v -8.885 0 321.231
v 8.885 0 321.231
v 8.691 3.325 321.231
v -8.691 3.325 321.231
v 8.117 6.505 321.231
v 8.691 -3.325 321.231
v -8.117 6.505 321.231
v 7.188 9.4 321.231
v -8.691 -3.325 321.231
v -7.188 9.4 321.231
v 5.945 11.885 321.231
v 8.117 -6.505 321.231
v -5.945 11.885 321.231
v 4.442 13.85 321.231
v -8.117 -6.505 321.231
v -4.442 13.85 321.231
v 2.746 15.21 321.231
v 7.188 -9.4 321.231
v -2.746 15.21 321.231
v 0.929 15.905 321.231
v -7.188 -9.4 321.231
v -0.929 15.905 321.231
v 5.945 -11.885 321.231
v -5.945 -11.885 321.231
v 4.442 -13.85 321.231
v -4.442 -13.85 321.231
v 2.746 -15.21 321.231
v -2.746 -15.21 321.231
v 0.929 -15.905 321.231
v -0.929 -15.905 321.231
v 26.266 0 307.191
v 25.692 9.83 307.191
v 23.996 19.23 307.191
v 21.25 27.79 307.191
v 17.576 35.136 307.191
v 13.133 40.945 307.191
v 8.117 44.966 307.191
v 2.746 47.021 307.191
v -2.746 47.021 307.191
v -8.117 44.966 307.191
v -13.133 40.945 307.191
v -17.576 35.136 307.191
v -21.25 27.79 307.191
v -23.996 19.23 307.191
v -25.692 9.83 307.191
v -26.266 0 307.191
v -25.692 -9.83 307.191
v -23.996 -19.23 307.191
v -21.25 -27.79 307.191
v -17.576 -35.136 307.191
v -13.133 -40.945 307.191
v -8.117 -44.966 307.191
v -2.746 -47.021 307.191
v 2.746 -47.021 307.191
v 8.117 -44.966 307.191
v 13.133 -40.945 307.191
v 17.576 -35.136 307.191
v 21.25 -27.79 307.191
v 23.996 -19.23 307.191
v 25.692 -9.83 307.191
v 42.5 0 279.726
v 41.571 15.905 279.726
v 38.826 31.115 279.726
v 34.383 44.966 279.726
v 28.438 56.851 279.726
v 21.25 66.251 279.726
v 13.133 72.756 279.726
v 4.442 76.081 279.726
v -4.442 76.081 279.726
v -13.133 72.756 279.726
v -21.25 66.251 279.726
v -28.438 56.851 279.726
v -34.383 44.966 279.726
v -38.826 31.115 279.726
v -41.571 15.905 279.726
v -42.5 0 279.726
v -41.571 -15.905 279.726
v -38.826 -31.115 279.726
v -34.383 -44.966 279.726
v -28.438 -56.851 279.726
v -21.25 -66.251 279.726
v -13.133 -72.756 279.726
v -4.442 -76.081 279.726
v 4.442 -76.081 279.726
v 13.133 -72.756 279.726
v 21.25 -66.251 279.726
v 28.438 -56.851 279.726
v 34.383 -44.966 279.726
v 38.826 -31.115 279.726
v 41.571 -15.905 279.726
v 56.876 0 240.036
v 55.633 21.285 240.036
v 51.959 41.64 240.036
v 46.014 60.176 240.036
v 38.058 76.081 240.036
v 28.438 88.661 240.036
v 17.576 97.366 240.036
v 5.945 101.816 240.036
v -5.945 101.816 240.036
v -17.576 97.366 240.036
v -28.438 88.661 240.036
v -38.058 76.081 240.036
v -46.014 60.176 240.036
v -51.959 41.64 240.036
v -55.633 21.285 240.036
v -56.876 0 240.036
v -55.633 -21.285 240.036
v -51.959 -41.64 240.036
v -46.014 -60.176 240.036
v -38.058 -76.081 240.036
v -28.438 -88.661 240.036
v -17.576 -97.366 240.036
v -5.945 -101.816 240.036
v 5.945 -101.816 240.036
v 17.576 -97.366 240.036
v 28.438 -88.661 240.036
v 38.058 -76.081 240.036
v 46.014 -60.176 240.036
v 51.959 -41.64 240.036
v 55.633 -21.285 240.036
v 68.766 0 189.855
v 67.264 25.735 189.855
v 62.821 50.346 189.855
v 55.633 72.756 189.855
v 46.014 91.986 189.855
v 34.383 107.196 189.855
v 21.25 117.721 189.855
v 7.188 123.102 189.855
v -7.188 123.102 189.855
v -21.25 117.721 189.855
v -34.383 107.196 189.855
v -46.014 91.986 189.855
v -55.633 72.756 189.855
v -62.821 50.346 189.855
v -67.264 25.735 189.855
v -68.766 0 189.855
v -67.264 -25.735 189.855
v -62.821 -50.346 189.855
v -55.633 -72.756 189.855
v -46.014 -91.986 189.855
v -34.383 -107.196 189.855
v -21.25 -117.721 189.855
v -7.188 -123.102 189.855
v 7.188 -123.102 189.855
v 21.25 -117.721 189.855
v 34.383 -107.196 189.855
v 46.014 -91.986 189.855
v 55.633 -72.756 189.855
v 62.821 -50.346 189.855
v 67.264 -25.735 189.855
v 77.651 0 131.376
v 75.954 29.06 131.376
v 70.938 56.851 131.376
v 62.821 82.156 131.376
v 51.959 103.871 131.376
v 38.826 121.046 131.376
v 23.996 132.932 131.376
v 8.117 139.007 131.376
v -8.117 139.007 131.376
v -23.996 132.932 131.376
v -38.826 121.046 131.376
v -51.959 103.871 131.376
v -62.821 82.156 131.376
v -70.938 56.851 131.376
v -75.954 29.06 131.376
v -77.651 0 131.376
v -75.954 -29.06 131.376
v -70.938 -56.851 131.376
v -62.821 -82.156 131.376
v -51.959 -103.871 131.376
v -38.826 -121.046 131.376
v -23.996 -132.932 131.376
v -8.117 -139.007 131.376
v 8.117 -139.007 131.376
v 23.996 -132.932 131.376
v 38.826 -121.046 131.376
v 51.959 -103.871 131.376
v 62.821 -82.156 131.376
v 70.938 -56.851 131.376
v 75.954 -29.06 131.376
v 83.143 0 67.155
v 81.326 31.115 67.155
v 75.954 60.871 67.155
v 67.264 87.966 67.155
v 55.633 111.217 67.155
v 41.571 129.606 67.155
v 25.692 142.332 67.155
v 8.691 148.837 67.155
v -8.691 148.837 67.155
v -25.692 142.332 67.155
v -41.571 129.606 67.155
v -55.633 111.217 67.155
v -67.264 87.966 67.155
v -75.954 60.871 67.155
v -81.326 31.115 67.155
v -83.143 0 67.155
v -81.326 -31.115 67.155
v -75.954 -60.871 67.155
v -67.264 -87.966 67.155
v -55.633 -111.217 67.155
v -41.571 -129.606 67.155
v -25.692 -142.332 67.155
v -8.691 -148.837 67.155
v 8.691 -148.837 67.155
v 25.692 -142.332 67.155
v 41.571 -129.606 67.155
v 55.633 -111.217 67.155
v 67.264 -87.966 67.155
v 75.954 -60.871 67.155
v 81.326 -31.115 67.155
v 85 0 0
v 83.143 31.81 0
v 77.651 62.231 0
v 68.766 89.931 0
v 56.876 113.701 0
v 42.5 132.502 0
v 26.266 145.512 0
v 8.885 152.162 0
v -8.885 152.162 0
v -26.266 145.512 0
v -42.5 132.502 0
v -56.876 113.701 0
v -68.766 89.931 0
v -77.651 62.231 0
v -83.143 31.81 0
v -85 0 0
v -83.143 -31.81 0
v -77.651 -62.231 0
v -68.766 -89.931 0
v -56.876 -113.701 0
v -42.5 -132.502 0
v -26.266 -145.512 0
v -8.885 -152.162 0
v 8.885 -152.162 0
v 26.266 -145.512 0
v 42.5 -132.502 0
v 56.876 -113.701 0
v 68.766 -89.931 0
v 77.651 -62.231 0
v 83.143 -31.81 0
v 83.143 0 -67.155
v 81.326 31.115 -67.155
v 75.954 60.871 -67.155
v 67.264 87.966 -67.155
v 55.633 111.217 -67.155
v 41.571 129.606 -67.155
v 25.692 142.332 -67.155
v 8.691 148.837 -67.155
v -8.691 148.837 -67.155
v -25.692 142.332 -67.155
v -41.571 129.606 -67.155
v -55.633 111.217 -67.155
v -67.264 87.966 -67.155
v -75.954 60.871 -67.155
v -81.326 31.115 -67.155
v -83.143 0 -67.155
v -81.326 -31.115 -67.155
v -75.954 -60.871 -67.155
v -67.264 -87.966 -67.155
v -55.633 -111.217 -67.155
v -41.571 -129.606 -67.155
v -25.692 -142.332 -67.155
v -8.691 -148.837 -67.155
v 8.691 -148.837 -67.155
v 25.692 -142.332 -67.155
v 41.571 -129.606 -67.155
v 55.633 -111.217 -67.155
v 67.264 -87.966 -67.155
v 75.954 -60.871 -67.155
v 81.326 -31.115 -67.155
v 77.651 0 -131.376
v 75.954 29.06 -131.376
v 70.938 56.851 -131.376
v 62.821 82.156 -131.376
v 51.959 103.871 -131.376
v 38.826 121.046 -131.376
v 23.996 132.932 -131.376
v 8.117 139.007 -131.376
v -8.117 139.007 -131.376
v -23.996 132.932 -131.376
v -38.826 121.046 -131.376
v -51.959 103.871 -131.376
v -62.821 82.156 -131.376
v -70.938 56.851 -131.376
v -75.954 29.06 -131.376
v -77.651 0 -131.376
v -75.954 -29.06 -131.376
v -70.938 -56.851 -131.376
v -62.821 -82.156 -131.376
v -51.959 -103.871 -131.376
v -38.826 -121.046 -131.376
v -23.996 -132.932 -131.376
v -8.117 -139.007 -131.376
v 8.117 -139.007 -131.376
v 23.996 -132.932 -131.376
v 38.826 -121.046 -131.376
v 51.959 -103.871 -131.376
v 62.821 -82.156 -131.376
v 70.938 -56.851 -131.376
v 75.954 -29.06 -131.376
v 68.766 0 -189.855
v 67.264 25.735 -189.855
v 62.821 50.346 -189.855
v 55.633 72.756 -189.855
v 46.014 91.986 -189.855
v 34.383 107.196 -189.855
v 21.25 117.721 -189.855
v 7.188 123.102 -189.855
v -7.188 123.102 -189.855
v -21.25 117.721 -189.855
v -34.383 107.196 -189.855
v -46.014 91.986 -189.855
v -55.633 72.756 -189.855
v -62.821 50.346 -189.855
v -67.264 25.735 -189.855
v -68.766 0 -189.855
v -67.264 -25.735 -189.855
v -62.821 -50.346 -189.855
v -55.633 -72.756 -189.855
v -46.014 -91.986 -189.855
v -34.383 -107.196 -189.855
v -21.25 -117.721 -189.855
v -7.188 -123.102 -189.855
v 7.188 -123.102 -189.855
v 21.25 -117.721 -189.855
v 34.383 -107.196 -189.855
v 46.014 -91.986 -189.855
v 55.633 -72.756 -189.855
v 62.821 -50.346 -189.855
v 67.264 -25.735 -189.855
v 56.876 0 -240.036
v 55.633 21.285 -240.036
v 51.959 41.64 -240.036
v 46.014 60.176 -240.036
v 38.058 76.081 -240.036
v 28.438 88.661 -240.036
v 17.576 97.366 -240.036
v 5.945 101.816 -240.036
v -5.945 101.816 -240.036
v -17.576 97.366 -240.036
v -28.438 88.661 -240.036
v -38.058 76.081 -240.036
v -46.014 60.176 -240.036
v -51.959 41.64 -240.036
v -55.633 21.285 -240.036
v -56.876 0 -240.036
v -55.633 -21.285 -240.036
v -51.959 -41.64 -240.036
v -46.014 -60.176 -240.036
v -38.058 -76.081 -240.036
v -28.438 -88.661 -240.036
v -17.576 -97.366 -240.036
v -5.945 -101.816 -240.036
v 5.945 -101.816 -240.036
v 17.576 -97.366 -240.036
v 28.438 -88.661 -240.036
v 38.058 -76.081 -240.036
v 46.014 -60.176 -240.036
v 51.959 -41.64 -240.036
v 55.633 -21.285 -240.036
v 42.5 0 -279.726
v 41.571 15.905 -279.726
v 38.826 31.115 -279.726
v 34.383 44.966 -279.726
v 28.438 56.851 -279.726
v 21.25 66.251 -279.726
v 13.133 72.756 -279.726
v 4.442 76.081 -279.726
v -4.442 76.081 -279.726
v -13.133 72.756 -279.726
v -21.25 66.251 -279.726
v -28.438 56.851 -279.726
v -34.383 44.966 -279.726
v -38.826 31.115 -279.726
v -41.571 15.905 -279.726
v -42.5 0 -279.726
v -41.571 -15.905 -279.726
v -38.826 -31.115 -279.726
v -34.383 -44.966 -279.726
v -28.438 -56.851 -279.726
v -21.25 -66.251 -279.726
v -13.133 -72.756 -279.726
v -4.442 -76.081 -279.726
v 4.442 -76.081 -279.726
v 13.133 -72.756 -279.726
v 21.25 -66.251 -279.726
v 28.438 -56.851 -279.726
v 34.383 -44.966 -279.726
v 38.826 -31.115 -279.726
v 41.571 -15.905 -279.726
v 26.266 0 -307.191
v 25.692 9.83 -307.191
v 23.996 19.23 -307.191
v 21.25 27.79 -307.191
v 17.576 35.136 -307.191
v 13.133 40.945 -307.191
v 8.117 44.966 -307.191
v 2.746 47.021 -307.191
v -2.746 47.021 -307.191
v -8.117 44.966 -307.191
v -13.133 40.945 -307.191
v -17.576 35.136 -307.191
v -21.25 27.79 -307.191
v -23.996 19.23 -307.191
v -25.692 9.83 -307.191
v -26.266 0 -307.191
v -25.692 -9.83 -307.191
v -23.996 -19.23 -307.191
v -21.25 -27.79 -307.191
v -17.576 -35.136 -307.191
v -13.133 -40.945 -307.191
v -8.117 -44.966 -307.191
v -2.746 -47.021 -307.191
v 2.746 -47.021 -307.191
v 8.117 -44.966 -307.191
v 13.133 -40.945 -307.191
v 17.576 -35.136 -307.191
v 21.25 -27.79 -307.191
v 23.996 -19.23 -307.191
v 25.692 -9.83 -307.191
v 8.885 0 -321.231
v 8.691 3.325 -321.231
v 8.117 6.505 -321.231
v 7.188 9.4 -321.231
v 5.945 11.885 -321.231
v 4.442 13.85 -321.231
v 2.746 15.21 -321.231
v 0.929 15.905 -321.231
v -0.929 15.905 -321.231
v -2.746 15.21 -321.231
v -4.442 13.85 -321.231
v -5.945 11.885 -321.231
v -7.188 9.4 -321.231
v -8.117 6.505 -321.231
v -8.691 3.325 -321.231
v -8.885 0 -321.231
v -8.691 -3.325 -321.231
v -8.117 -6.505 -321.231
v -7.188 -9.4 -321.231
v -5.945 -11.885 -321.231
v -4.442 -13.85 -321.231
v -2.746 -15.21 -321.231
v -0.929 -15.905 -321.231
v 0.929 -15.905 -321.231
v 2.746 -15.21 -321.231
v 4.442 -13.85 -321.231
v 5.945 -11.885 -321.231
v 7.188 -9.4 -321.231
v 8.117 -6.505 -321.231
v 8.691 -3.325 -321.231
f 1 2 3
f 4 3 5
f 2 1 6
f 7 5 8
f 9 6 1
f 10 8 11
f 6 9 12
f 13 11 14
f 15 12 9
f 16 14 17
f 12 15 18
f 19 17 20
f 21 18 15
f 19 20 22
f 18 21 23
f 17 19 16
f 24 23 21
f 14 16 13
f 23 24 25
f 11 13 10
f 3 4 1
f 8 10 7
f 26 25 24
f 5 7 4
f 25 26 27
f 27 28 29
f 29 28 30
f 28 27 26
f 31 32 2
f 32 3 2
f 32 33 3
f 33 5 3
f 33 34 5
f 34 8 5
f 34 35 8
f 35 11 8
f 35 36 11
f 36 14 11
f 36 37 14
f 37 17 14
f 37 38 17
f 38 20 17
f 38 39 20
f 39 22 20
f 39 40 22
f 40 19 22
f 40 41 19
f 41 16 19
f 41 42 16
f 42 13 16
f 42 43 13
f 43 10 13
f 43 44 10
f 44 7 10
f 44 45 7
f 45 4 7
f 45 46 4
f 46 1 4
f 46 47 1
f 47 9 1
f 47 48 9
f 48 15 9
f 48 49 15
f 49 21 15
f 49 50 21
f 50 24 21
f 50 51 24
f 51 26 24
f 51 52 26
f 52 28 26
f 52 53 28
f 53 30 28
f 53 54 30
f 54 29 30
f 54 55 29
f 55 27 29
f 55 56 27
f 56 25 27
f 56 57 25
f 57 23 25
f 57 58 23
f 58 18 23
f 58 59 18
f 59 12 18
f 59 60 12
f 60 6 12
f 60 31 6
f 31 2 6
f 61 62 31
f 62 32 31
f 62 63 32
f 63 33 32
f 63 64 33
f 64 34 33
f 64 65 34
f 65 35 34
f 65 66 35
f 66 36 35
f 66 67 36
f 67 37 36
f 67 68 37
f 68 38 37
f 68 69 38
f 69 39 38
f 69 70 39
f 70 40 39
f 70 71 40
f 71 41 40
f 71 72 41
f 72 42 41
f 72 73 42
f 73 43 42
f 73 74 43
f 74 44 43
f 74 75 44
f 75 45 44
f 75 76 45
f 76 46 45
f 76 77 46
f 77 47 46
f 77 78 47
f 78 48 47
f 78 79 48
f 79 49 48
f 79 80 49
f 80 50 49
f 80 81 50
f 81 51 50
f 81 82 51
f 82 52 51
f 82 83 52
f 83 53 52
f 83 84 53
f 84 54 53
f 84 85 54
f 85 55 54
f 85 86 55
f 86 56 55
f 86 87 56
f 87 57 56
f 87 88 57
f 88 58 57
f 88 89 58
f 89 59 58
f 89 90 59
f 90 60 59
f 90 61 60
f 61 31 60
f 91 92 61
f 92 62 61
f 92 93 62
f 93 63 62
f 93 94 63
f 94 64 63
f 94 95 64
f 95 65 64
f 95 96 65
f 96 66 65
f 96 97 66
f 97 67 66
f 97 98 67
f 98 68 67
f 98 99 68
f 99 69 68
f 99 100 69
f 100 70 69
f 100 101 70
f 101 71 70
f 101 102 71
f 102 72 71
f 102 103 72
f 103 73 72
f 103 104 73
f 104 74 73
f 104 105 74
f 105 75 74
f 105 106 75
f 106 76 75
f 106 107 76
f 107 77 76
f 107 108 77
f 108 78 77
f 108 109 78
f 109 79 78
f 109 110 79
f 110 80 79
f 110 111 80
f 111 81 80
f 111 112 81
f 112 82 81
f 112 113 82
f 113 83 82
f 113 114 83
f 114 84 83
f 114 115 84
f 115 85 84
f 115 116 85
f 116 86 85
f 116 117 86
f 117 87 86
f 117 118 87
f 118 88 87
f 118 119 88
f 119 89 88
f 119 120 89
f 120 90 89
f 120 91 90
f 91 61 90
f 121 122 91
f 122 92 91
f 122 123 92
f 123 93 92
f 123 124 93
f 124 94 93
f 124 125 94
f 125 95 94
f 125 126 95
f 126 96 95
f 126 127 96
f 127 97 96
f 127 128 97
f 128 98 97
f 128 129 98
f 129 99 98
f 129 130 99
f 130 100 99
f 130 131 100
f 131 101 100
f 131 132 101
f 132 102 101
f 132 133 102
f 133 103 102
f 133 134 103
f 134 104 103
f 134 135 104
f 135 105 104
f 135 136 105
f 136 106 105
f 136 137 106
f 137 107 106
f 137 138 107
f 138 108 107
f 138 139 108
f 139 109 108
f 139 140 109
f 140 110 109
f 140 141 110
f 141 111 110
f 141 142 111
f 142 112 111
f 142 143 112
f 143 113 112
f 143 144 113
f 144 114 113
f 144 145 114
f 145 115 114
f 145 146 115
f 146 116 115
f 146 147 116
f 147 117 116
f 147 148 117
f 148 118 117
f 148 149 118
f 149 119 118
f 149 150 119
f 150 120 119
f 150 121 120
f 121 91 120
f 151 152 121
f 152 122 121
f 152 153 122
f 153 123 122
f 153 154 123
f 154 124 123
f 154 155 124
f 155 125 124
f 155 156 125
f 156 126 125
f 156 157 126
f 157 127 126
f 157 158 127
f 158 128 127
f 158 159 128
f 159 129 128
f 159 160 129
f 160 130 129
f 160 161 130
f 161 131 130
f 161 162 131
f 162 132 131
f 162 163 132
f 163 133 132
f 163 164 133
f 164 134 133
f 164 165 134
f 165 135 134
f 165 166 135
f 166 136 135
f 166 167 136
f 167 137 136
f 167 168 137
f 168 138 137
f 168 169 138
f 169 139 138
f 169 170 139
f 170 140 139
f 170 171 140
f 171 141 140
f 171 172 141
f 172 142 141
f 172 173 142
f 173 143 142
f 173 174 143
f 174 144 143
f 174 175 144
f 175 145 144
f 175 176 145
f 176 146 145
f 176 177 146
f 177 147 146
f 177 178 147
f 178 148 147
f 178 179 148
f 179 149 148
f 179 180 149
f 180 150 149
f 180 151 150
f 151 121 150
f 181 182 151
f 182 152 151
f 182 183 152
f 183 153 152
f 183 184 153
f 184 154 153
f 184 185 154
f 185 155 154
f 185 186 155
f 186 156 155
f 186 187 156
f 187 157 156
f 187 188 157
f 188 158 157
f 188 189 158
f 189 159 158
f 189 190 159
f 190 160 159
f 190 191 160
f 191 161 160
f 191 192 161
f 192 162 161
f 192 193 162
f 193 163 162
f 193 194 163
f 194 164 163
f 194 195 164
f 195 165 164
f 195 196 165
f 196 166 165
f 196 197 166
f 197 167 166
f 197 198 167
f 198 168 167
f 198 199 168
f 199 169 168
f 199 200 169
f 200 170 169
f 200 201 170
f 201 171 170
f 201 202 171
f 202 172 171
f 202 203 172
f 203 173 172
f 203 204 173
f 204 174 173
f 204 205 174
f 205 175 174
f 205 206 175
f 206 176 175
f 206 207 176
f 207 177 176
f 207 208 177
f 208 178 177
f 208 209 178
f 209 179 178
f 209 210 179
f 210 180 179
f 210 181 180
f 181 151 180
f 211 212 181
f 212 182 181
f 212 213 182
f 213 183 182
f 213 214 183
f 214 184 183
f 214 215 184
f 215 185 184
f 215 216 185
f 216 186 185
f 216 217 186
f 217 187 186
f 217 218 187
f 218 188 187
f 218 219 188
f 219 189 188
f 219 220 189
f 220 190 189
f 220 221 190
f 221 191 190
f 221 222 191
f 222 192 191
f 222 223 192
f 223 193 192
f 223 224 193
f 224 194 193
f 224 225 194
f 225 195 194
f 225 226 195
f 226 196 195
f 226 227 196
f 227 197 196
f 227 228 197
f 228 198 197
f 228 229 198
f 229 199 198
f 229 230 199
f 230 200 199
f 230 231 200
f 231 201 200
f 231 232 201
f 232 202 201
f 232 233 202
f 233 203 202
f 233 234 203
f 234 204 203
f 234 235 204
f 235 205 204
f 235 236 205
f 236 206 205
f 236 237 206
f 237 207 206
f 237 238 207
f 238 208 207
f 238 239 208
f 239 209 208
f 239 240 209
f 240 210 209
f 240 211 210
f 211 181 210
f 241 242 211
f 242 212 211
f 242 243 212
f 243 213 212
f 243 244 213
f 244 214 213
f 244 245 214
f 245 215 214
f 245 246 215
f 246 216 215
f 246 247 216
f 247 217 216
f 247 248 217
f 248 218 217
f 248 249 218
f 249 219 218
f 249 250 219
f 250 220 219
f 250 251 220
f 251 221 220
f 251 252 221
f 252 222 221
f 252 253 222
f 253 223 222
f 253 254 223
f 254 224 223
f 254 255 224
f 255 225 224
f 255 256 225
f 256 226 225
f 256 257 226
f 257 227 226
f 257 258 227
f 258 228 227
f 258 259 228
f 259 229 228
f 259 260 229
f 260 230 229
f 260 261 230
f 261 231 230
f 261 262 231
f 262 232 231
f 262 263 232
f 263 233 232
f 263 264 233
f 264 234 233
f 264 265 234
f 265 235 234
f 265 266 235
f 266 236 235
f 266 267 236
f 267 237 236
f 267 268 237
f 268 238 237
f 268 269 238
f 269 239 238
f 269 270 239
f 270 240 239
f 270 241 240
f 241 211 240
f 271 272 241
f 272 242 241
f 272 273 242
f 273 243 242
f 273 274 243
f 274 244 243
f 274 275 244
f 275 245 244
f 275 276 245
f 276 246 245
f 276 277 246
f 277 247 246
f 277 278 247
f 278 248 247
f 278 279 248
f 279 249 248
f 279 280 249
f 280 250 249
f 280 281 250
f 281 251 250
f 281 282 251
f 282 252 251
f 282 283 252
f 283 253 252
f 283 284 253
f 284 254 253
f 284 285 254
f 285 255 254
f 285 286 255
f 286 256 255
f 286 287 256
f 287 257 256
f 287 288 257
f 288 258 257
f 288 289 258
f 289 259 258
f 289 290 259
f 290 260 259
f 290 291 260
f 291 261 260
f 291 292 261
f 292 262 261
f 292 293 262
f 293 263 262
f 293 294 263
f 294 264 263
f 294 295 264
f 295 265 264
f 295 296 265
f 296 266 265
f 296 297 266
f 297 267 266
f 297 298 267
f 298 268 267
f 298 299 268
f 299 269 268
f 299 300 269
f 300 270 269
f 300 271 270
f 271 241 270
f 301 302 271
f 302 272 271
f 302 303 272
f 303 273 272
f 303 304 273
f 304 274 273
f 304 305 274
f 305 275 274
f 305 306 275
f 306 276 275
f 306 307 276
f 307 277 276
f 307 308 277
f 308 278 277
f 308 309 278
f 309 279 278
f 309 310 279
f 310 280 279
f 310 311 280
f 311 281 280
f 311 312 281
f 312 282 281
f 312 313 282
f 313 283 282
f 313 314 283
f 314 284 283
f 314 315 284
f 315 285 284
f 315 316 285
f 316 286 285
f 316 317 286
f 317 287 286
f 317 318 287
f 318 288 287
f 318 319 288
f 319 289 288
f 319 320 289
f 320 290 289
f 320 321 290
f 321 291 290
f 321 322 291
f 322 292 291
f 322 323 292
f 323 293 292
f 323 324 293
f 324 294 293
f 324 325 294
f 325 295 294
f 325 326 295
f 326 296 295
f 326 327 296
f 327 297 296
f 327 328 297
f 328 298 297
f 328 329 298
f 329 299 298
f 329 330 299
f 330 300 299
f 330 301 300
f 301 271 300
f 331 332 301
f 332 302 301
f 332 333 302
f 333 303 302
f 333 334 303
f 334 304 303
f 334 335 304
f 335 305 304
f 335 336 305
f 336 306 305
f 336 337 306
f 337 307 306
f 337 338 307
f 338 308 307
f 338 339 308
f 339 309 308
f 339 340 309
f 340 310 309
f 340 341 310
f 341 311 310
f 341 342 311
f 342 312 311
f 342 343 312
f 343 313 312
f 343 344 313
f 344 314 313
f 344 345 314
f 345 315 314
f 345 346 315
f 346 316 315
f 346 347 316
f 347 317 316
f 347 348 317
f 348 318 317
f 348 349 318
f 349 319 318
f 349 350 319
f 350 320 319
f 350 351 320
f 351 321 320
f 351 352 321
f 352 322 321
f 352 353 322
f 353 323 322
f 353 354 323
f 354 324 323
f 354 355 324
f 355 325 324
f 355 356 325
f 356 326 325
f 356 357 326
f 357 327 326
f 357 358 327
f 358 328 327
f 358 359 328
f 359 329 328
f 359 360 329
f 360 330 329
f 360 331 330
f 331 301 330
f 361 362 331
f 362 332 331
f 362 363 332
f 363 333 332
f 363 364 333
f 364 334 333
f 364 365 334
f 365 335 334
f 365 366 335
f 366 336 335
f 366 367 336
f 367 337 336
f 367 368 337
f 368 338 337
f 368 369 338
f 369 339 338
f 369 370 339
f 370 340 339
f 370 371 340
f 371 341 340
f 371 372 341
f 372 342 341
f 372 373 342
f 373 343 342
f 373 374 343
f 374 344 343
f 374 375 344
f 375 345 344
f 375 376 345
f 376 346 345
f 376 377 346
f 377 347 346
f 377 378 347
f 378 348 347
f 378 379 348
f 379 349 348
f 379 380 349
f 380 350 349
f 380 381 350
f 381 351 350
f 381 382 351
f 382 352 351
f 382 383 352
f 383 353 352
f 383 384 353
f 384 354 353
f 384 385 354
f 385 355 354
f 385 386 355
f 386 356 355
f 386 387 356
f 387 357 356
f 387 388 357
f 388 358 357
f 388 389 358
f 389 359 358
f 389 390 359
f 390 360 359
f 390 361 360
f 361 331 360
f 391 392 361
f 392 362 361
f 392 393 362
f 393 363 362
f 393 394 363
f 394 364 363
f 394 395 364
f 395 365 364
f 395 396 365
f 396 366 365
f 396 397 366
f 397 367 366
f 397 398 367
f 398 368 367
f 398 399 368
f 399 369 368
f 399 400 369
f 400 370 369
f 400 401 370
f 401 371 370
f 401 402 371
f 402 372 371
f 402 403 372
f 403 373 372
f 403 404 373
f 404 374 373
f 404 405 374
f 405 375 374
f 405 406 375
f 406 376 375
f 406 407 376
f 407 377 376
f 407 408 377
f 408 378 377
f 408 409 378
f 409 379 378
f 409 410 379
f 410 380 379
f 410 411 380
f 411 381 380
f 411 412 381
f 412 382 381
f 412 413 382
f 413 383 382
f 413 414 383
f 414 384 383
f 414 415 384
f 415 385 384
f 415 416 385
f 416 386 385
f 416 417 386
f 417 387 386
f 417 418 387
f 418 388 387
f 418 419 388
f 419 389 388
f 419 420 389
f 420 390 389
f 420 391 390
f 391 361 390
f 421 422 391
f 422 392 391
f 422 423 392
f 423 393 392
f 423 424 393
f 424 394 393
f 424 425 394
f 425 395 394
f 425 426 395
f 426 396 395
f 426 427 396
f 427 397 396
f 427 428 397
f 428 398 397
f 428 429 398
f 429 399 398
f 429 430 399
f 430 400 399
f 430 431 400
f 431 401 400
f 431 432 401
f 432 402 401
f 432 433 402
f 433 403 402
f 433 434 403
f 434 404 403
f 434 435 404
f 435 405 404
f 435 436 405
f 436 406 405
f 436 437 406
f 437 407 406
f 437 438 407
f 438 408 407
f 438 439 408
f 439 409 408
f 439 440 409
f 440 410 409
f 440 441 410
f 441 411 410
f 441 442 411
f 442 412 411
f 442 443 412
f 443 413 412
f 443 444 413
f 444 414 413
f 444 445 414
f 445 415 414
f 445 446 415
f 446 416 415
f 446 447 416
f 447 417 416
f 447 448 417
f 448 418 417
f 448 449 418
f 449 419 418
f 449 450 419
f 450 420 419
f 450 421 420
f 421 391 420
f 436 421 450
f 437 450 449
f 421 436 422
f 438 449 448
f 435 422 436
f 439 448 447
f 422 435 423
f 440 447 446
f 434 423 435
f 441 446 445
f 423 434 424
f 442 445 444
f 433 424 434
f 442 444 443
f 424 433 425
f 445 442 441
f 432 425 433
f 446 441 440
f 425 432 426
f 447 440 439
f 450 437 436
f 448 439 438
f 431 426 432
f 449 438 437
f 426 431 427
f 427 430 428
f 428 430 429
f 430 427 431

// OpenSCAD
// Generated by SolidPython 1.0.1 on 2020-07-29 00:46:46


scale(v = [5, 9, 19]) {
	sphere(r = 17);
}
/***********************************************
*********      SolidPython code:      **********
************************************************
 
# import packages: SolidPython
from solid import *
from solid.utils import *
from itertools import chain, combinations, permutations


class Resize:

    def __init__(self, scad_file):
        self.scad_file = scad_file
        #self.scad_file = import_scad(scad_file)
        # cone/cylinder param:
        self.r1 = 0
        self.r2 = 0
        self.h = 0
        # rectangular prism param:
        self.w = 0
        self.l = 0
        # ellipse param:
        self.r = 0

    # import OpenScad code (file name corresponds to shape)


    # classify shape + parameters
    def assign(self, param1, param2, param3):
        if self.scad_file == 'cone.scad':
            self.r1 = param1
            self.r2 = param2
            self.h = param3
        elif self.scad_file == 'cylinder.scad':
            self.r1 = param1
            self.r2 = param2
            self.h = param3
        elif self.scad_file == 'rectangularPrism.scad':
            self.h = param1
            self.l = param2
            self.w = param3
        else:
            self.r = param1
            self.h = param2

    # resize parameters
    def iterate(self):
        x = range(3, 20, 2)
        i = 1
        if self.scad_file == 'cone.scad':
            tempList = list(permutations(x, 2))
            for temp in tempList:
                param1 = temp[0]
                param2 = temp[1]
                filepath = 'produced_scad_files/' + 'cone' + str(param1) + '_' + str(param2) + '_' + '.scad'
                scad_render_to_file(cylinder(h=param1, r1=param2, r2=0), filepath)

        elif self.scad_file == 'cylinder.scad':
            tempList = list(permutations(x, 3))
            for temp in tempList:
                param1 = temp[0]
                param2 = temp[1]
                filepath = 'produced_scad_files/' + 'cylinder' + str(param1) + '_' + str(param2) + '_' + '.scad'
                scad_render_to_file(cylinder(h=param1, r1=param2, r2=param2), filepath)

        elif self.scad_file == 'rectangularPrism.scad':
            tempList = list(permutations(x, 3))
            for temp in tempList:
                param1 = temp[0]
                param2 = temp[1]
                param3 = temp[2]
                filepath = 'produced_scad_files/' + 'rectangularPrism' + str(param1) + '_' + str(param2) + '_' + str(
                    param3) + '.scad'
                scad_render_to_file(cube(size=(param1, param2, param3)), filepath)

        elif self.scad_file == 'ellipse.scad':
            tempList = list(permutations(x, 4))
            for temp in tempList:
                param1 = temp[0]
                param2 = temp[1]
                param3 = temp[2]
                param4 = temp[3]
                filepath = 'produced_scad_files/' + 'ellipse' + str(param1) + '_' + str(param2) + '_' + str(param3) + '_' + str(param4) + '.scad'
                scad_render_to_file(scale([param1, param2, param3])(sphere(r=param4)), filepath)

    def render_to_scadfile(self):
        scad_render_to_file(scad, 'example.scad') 
 
************************************************/
